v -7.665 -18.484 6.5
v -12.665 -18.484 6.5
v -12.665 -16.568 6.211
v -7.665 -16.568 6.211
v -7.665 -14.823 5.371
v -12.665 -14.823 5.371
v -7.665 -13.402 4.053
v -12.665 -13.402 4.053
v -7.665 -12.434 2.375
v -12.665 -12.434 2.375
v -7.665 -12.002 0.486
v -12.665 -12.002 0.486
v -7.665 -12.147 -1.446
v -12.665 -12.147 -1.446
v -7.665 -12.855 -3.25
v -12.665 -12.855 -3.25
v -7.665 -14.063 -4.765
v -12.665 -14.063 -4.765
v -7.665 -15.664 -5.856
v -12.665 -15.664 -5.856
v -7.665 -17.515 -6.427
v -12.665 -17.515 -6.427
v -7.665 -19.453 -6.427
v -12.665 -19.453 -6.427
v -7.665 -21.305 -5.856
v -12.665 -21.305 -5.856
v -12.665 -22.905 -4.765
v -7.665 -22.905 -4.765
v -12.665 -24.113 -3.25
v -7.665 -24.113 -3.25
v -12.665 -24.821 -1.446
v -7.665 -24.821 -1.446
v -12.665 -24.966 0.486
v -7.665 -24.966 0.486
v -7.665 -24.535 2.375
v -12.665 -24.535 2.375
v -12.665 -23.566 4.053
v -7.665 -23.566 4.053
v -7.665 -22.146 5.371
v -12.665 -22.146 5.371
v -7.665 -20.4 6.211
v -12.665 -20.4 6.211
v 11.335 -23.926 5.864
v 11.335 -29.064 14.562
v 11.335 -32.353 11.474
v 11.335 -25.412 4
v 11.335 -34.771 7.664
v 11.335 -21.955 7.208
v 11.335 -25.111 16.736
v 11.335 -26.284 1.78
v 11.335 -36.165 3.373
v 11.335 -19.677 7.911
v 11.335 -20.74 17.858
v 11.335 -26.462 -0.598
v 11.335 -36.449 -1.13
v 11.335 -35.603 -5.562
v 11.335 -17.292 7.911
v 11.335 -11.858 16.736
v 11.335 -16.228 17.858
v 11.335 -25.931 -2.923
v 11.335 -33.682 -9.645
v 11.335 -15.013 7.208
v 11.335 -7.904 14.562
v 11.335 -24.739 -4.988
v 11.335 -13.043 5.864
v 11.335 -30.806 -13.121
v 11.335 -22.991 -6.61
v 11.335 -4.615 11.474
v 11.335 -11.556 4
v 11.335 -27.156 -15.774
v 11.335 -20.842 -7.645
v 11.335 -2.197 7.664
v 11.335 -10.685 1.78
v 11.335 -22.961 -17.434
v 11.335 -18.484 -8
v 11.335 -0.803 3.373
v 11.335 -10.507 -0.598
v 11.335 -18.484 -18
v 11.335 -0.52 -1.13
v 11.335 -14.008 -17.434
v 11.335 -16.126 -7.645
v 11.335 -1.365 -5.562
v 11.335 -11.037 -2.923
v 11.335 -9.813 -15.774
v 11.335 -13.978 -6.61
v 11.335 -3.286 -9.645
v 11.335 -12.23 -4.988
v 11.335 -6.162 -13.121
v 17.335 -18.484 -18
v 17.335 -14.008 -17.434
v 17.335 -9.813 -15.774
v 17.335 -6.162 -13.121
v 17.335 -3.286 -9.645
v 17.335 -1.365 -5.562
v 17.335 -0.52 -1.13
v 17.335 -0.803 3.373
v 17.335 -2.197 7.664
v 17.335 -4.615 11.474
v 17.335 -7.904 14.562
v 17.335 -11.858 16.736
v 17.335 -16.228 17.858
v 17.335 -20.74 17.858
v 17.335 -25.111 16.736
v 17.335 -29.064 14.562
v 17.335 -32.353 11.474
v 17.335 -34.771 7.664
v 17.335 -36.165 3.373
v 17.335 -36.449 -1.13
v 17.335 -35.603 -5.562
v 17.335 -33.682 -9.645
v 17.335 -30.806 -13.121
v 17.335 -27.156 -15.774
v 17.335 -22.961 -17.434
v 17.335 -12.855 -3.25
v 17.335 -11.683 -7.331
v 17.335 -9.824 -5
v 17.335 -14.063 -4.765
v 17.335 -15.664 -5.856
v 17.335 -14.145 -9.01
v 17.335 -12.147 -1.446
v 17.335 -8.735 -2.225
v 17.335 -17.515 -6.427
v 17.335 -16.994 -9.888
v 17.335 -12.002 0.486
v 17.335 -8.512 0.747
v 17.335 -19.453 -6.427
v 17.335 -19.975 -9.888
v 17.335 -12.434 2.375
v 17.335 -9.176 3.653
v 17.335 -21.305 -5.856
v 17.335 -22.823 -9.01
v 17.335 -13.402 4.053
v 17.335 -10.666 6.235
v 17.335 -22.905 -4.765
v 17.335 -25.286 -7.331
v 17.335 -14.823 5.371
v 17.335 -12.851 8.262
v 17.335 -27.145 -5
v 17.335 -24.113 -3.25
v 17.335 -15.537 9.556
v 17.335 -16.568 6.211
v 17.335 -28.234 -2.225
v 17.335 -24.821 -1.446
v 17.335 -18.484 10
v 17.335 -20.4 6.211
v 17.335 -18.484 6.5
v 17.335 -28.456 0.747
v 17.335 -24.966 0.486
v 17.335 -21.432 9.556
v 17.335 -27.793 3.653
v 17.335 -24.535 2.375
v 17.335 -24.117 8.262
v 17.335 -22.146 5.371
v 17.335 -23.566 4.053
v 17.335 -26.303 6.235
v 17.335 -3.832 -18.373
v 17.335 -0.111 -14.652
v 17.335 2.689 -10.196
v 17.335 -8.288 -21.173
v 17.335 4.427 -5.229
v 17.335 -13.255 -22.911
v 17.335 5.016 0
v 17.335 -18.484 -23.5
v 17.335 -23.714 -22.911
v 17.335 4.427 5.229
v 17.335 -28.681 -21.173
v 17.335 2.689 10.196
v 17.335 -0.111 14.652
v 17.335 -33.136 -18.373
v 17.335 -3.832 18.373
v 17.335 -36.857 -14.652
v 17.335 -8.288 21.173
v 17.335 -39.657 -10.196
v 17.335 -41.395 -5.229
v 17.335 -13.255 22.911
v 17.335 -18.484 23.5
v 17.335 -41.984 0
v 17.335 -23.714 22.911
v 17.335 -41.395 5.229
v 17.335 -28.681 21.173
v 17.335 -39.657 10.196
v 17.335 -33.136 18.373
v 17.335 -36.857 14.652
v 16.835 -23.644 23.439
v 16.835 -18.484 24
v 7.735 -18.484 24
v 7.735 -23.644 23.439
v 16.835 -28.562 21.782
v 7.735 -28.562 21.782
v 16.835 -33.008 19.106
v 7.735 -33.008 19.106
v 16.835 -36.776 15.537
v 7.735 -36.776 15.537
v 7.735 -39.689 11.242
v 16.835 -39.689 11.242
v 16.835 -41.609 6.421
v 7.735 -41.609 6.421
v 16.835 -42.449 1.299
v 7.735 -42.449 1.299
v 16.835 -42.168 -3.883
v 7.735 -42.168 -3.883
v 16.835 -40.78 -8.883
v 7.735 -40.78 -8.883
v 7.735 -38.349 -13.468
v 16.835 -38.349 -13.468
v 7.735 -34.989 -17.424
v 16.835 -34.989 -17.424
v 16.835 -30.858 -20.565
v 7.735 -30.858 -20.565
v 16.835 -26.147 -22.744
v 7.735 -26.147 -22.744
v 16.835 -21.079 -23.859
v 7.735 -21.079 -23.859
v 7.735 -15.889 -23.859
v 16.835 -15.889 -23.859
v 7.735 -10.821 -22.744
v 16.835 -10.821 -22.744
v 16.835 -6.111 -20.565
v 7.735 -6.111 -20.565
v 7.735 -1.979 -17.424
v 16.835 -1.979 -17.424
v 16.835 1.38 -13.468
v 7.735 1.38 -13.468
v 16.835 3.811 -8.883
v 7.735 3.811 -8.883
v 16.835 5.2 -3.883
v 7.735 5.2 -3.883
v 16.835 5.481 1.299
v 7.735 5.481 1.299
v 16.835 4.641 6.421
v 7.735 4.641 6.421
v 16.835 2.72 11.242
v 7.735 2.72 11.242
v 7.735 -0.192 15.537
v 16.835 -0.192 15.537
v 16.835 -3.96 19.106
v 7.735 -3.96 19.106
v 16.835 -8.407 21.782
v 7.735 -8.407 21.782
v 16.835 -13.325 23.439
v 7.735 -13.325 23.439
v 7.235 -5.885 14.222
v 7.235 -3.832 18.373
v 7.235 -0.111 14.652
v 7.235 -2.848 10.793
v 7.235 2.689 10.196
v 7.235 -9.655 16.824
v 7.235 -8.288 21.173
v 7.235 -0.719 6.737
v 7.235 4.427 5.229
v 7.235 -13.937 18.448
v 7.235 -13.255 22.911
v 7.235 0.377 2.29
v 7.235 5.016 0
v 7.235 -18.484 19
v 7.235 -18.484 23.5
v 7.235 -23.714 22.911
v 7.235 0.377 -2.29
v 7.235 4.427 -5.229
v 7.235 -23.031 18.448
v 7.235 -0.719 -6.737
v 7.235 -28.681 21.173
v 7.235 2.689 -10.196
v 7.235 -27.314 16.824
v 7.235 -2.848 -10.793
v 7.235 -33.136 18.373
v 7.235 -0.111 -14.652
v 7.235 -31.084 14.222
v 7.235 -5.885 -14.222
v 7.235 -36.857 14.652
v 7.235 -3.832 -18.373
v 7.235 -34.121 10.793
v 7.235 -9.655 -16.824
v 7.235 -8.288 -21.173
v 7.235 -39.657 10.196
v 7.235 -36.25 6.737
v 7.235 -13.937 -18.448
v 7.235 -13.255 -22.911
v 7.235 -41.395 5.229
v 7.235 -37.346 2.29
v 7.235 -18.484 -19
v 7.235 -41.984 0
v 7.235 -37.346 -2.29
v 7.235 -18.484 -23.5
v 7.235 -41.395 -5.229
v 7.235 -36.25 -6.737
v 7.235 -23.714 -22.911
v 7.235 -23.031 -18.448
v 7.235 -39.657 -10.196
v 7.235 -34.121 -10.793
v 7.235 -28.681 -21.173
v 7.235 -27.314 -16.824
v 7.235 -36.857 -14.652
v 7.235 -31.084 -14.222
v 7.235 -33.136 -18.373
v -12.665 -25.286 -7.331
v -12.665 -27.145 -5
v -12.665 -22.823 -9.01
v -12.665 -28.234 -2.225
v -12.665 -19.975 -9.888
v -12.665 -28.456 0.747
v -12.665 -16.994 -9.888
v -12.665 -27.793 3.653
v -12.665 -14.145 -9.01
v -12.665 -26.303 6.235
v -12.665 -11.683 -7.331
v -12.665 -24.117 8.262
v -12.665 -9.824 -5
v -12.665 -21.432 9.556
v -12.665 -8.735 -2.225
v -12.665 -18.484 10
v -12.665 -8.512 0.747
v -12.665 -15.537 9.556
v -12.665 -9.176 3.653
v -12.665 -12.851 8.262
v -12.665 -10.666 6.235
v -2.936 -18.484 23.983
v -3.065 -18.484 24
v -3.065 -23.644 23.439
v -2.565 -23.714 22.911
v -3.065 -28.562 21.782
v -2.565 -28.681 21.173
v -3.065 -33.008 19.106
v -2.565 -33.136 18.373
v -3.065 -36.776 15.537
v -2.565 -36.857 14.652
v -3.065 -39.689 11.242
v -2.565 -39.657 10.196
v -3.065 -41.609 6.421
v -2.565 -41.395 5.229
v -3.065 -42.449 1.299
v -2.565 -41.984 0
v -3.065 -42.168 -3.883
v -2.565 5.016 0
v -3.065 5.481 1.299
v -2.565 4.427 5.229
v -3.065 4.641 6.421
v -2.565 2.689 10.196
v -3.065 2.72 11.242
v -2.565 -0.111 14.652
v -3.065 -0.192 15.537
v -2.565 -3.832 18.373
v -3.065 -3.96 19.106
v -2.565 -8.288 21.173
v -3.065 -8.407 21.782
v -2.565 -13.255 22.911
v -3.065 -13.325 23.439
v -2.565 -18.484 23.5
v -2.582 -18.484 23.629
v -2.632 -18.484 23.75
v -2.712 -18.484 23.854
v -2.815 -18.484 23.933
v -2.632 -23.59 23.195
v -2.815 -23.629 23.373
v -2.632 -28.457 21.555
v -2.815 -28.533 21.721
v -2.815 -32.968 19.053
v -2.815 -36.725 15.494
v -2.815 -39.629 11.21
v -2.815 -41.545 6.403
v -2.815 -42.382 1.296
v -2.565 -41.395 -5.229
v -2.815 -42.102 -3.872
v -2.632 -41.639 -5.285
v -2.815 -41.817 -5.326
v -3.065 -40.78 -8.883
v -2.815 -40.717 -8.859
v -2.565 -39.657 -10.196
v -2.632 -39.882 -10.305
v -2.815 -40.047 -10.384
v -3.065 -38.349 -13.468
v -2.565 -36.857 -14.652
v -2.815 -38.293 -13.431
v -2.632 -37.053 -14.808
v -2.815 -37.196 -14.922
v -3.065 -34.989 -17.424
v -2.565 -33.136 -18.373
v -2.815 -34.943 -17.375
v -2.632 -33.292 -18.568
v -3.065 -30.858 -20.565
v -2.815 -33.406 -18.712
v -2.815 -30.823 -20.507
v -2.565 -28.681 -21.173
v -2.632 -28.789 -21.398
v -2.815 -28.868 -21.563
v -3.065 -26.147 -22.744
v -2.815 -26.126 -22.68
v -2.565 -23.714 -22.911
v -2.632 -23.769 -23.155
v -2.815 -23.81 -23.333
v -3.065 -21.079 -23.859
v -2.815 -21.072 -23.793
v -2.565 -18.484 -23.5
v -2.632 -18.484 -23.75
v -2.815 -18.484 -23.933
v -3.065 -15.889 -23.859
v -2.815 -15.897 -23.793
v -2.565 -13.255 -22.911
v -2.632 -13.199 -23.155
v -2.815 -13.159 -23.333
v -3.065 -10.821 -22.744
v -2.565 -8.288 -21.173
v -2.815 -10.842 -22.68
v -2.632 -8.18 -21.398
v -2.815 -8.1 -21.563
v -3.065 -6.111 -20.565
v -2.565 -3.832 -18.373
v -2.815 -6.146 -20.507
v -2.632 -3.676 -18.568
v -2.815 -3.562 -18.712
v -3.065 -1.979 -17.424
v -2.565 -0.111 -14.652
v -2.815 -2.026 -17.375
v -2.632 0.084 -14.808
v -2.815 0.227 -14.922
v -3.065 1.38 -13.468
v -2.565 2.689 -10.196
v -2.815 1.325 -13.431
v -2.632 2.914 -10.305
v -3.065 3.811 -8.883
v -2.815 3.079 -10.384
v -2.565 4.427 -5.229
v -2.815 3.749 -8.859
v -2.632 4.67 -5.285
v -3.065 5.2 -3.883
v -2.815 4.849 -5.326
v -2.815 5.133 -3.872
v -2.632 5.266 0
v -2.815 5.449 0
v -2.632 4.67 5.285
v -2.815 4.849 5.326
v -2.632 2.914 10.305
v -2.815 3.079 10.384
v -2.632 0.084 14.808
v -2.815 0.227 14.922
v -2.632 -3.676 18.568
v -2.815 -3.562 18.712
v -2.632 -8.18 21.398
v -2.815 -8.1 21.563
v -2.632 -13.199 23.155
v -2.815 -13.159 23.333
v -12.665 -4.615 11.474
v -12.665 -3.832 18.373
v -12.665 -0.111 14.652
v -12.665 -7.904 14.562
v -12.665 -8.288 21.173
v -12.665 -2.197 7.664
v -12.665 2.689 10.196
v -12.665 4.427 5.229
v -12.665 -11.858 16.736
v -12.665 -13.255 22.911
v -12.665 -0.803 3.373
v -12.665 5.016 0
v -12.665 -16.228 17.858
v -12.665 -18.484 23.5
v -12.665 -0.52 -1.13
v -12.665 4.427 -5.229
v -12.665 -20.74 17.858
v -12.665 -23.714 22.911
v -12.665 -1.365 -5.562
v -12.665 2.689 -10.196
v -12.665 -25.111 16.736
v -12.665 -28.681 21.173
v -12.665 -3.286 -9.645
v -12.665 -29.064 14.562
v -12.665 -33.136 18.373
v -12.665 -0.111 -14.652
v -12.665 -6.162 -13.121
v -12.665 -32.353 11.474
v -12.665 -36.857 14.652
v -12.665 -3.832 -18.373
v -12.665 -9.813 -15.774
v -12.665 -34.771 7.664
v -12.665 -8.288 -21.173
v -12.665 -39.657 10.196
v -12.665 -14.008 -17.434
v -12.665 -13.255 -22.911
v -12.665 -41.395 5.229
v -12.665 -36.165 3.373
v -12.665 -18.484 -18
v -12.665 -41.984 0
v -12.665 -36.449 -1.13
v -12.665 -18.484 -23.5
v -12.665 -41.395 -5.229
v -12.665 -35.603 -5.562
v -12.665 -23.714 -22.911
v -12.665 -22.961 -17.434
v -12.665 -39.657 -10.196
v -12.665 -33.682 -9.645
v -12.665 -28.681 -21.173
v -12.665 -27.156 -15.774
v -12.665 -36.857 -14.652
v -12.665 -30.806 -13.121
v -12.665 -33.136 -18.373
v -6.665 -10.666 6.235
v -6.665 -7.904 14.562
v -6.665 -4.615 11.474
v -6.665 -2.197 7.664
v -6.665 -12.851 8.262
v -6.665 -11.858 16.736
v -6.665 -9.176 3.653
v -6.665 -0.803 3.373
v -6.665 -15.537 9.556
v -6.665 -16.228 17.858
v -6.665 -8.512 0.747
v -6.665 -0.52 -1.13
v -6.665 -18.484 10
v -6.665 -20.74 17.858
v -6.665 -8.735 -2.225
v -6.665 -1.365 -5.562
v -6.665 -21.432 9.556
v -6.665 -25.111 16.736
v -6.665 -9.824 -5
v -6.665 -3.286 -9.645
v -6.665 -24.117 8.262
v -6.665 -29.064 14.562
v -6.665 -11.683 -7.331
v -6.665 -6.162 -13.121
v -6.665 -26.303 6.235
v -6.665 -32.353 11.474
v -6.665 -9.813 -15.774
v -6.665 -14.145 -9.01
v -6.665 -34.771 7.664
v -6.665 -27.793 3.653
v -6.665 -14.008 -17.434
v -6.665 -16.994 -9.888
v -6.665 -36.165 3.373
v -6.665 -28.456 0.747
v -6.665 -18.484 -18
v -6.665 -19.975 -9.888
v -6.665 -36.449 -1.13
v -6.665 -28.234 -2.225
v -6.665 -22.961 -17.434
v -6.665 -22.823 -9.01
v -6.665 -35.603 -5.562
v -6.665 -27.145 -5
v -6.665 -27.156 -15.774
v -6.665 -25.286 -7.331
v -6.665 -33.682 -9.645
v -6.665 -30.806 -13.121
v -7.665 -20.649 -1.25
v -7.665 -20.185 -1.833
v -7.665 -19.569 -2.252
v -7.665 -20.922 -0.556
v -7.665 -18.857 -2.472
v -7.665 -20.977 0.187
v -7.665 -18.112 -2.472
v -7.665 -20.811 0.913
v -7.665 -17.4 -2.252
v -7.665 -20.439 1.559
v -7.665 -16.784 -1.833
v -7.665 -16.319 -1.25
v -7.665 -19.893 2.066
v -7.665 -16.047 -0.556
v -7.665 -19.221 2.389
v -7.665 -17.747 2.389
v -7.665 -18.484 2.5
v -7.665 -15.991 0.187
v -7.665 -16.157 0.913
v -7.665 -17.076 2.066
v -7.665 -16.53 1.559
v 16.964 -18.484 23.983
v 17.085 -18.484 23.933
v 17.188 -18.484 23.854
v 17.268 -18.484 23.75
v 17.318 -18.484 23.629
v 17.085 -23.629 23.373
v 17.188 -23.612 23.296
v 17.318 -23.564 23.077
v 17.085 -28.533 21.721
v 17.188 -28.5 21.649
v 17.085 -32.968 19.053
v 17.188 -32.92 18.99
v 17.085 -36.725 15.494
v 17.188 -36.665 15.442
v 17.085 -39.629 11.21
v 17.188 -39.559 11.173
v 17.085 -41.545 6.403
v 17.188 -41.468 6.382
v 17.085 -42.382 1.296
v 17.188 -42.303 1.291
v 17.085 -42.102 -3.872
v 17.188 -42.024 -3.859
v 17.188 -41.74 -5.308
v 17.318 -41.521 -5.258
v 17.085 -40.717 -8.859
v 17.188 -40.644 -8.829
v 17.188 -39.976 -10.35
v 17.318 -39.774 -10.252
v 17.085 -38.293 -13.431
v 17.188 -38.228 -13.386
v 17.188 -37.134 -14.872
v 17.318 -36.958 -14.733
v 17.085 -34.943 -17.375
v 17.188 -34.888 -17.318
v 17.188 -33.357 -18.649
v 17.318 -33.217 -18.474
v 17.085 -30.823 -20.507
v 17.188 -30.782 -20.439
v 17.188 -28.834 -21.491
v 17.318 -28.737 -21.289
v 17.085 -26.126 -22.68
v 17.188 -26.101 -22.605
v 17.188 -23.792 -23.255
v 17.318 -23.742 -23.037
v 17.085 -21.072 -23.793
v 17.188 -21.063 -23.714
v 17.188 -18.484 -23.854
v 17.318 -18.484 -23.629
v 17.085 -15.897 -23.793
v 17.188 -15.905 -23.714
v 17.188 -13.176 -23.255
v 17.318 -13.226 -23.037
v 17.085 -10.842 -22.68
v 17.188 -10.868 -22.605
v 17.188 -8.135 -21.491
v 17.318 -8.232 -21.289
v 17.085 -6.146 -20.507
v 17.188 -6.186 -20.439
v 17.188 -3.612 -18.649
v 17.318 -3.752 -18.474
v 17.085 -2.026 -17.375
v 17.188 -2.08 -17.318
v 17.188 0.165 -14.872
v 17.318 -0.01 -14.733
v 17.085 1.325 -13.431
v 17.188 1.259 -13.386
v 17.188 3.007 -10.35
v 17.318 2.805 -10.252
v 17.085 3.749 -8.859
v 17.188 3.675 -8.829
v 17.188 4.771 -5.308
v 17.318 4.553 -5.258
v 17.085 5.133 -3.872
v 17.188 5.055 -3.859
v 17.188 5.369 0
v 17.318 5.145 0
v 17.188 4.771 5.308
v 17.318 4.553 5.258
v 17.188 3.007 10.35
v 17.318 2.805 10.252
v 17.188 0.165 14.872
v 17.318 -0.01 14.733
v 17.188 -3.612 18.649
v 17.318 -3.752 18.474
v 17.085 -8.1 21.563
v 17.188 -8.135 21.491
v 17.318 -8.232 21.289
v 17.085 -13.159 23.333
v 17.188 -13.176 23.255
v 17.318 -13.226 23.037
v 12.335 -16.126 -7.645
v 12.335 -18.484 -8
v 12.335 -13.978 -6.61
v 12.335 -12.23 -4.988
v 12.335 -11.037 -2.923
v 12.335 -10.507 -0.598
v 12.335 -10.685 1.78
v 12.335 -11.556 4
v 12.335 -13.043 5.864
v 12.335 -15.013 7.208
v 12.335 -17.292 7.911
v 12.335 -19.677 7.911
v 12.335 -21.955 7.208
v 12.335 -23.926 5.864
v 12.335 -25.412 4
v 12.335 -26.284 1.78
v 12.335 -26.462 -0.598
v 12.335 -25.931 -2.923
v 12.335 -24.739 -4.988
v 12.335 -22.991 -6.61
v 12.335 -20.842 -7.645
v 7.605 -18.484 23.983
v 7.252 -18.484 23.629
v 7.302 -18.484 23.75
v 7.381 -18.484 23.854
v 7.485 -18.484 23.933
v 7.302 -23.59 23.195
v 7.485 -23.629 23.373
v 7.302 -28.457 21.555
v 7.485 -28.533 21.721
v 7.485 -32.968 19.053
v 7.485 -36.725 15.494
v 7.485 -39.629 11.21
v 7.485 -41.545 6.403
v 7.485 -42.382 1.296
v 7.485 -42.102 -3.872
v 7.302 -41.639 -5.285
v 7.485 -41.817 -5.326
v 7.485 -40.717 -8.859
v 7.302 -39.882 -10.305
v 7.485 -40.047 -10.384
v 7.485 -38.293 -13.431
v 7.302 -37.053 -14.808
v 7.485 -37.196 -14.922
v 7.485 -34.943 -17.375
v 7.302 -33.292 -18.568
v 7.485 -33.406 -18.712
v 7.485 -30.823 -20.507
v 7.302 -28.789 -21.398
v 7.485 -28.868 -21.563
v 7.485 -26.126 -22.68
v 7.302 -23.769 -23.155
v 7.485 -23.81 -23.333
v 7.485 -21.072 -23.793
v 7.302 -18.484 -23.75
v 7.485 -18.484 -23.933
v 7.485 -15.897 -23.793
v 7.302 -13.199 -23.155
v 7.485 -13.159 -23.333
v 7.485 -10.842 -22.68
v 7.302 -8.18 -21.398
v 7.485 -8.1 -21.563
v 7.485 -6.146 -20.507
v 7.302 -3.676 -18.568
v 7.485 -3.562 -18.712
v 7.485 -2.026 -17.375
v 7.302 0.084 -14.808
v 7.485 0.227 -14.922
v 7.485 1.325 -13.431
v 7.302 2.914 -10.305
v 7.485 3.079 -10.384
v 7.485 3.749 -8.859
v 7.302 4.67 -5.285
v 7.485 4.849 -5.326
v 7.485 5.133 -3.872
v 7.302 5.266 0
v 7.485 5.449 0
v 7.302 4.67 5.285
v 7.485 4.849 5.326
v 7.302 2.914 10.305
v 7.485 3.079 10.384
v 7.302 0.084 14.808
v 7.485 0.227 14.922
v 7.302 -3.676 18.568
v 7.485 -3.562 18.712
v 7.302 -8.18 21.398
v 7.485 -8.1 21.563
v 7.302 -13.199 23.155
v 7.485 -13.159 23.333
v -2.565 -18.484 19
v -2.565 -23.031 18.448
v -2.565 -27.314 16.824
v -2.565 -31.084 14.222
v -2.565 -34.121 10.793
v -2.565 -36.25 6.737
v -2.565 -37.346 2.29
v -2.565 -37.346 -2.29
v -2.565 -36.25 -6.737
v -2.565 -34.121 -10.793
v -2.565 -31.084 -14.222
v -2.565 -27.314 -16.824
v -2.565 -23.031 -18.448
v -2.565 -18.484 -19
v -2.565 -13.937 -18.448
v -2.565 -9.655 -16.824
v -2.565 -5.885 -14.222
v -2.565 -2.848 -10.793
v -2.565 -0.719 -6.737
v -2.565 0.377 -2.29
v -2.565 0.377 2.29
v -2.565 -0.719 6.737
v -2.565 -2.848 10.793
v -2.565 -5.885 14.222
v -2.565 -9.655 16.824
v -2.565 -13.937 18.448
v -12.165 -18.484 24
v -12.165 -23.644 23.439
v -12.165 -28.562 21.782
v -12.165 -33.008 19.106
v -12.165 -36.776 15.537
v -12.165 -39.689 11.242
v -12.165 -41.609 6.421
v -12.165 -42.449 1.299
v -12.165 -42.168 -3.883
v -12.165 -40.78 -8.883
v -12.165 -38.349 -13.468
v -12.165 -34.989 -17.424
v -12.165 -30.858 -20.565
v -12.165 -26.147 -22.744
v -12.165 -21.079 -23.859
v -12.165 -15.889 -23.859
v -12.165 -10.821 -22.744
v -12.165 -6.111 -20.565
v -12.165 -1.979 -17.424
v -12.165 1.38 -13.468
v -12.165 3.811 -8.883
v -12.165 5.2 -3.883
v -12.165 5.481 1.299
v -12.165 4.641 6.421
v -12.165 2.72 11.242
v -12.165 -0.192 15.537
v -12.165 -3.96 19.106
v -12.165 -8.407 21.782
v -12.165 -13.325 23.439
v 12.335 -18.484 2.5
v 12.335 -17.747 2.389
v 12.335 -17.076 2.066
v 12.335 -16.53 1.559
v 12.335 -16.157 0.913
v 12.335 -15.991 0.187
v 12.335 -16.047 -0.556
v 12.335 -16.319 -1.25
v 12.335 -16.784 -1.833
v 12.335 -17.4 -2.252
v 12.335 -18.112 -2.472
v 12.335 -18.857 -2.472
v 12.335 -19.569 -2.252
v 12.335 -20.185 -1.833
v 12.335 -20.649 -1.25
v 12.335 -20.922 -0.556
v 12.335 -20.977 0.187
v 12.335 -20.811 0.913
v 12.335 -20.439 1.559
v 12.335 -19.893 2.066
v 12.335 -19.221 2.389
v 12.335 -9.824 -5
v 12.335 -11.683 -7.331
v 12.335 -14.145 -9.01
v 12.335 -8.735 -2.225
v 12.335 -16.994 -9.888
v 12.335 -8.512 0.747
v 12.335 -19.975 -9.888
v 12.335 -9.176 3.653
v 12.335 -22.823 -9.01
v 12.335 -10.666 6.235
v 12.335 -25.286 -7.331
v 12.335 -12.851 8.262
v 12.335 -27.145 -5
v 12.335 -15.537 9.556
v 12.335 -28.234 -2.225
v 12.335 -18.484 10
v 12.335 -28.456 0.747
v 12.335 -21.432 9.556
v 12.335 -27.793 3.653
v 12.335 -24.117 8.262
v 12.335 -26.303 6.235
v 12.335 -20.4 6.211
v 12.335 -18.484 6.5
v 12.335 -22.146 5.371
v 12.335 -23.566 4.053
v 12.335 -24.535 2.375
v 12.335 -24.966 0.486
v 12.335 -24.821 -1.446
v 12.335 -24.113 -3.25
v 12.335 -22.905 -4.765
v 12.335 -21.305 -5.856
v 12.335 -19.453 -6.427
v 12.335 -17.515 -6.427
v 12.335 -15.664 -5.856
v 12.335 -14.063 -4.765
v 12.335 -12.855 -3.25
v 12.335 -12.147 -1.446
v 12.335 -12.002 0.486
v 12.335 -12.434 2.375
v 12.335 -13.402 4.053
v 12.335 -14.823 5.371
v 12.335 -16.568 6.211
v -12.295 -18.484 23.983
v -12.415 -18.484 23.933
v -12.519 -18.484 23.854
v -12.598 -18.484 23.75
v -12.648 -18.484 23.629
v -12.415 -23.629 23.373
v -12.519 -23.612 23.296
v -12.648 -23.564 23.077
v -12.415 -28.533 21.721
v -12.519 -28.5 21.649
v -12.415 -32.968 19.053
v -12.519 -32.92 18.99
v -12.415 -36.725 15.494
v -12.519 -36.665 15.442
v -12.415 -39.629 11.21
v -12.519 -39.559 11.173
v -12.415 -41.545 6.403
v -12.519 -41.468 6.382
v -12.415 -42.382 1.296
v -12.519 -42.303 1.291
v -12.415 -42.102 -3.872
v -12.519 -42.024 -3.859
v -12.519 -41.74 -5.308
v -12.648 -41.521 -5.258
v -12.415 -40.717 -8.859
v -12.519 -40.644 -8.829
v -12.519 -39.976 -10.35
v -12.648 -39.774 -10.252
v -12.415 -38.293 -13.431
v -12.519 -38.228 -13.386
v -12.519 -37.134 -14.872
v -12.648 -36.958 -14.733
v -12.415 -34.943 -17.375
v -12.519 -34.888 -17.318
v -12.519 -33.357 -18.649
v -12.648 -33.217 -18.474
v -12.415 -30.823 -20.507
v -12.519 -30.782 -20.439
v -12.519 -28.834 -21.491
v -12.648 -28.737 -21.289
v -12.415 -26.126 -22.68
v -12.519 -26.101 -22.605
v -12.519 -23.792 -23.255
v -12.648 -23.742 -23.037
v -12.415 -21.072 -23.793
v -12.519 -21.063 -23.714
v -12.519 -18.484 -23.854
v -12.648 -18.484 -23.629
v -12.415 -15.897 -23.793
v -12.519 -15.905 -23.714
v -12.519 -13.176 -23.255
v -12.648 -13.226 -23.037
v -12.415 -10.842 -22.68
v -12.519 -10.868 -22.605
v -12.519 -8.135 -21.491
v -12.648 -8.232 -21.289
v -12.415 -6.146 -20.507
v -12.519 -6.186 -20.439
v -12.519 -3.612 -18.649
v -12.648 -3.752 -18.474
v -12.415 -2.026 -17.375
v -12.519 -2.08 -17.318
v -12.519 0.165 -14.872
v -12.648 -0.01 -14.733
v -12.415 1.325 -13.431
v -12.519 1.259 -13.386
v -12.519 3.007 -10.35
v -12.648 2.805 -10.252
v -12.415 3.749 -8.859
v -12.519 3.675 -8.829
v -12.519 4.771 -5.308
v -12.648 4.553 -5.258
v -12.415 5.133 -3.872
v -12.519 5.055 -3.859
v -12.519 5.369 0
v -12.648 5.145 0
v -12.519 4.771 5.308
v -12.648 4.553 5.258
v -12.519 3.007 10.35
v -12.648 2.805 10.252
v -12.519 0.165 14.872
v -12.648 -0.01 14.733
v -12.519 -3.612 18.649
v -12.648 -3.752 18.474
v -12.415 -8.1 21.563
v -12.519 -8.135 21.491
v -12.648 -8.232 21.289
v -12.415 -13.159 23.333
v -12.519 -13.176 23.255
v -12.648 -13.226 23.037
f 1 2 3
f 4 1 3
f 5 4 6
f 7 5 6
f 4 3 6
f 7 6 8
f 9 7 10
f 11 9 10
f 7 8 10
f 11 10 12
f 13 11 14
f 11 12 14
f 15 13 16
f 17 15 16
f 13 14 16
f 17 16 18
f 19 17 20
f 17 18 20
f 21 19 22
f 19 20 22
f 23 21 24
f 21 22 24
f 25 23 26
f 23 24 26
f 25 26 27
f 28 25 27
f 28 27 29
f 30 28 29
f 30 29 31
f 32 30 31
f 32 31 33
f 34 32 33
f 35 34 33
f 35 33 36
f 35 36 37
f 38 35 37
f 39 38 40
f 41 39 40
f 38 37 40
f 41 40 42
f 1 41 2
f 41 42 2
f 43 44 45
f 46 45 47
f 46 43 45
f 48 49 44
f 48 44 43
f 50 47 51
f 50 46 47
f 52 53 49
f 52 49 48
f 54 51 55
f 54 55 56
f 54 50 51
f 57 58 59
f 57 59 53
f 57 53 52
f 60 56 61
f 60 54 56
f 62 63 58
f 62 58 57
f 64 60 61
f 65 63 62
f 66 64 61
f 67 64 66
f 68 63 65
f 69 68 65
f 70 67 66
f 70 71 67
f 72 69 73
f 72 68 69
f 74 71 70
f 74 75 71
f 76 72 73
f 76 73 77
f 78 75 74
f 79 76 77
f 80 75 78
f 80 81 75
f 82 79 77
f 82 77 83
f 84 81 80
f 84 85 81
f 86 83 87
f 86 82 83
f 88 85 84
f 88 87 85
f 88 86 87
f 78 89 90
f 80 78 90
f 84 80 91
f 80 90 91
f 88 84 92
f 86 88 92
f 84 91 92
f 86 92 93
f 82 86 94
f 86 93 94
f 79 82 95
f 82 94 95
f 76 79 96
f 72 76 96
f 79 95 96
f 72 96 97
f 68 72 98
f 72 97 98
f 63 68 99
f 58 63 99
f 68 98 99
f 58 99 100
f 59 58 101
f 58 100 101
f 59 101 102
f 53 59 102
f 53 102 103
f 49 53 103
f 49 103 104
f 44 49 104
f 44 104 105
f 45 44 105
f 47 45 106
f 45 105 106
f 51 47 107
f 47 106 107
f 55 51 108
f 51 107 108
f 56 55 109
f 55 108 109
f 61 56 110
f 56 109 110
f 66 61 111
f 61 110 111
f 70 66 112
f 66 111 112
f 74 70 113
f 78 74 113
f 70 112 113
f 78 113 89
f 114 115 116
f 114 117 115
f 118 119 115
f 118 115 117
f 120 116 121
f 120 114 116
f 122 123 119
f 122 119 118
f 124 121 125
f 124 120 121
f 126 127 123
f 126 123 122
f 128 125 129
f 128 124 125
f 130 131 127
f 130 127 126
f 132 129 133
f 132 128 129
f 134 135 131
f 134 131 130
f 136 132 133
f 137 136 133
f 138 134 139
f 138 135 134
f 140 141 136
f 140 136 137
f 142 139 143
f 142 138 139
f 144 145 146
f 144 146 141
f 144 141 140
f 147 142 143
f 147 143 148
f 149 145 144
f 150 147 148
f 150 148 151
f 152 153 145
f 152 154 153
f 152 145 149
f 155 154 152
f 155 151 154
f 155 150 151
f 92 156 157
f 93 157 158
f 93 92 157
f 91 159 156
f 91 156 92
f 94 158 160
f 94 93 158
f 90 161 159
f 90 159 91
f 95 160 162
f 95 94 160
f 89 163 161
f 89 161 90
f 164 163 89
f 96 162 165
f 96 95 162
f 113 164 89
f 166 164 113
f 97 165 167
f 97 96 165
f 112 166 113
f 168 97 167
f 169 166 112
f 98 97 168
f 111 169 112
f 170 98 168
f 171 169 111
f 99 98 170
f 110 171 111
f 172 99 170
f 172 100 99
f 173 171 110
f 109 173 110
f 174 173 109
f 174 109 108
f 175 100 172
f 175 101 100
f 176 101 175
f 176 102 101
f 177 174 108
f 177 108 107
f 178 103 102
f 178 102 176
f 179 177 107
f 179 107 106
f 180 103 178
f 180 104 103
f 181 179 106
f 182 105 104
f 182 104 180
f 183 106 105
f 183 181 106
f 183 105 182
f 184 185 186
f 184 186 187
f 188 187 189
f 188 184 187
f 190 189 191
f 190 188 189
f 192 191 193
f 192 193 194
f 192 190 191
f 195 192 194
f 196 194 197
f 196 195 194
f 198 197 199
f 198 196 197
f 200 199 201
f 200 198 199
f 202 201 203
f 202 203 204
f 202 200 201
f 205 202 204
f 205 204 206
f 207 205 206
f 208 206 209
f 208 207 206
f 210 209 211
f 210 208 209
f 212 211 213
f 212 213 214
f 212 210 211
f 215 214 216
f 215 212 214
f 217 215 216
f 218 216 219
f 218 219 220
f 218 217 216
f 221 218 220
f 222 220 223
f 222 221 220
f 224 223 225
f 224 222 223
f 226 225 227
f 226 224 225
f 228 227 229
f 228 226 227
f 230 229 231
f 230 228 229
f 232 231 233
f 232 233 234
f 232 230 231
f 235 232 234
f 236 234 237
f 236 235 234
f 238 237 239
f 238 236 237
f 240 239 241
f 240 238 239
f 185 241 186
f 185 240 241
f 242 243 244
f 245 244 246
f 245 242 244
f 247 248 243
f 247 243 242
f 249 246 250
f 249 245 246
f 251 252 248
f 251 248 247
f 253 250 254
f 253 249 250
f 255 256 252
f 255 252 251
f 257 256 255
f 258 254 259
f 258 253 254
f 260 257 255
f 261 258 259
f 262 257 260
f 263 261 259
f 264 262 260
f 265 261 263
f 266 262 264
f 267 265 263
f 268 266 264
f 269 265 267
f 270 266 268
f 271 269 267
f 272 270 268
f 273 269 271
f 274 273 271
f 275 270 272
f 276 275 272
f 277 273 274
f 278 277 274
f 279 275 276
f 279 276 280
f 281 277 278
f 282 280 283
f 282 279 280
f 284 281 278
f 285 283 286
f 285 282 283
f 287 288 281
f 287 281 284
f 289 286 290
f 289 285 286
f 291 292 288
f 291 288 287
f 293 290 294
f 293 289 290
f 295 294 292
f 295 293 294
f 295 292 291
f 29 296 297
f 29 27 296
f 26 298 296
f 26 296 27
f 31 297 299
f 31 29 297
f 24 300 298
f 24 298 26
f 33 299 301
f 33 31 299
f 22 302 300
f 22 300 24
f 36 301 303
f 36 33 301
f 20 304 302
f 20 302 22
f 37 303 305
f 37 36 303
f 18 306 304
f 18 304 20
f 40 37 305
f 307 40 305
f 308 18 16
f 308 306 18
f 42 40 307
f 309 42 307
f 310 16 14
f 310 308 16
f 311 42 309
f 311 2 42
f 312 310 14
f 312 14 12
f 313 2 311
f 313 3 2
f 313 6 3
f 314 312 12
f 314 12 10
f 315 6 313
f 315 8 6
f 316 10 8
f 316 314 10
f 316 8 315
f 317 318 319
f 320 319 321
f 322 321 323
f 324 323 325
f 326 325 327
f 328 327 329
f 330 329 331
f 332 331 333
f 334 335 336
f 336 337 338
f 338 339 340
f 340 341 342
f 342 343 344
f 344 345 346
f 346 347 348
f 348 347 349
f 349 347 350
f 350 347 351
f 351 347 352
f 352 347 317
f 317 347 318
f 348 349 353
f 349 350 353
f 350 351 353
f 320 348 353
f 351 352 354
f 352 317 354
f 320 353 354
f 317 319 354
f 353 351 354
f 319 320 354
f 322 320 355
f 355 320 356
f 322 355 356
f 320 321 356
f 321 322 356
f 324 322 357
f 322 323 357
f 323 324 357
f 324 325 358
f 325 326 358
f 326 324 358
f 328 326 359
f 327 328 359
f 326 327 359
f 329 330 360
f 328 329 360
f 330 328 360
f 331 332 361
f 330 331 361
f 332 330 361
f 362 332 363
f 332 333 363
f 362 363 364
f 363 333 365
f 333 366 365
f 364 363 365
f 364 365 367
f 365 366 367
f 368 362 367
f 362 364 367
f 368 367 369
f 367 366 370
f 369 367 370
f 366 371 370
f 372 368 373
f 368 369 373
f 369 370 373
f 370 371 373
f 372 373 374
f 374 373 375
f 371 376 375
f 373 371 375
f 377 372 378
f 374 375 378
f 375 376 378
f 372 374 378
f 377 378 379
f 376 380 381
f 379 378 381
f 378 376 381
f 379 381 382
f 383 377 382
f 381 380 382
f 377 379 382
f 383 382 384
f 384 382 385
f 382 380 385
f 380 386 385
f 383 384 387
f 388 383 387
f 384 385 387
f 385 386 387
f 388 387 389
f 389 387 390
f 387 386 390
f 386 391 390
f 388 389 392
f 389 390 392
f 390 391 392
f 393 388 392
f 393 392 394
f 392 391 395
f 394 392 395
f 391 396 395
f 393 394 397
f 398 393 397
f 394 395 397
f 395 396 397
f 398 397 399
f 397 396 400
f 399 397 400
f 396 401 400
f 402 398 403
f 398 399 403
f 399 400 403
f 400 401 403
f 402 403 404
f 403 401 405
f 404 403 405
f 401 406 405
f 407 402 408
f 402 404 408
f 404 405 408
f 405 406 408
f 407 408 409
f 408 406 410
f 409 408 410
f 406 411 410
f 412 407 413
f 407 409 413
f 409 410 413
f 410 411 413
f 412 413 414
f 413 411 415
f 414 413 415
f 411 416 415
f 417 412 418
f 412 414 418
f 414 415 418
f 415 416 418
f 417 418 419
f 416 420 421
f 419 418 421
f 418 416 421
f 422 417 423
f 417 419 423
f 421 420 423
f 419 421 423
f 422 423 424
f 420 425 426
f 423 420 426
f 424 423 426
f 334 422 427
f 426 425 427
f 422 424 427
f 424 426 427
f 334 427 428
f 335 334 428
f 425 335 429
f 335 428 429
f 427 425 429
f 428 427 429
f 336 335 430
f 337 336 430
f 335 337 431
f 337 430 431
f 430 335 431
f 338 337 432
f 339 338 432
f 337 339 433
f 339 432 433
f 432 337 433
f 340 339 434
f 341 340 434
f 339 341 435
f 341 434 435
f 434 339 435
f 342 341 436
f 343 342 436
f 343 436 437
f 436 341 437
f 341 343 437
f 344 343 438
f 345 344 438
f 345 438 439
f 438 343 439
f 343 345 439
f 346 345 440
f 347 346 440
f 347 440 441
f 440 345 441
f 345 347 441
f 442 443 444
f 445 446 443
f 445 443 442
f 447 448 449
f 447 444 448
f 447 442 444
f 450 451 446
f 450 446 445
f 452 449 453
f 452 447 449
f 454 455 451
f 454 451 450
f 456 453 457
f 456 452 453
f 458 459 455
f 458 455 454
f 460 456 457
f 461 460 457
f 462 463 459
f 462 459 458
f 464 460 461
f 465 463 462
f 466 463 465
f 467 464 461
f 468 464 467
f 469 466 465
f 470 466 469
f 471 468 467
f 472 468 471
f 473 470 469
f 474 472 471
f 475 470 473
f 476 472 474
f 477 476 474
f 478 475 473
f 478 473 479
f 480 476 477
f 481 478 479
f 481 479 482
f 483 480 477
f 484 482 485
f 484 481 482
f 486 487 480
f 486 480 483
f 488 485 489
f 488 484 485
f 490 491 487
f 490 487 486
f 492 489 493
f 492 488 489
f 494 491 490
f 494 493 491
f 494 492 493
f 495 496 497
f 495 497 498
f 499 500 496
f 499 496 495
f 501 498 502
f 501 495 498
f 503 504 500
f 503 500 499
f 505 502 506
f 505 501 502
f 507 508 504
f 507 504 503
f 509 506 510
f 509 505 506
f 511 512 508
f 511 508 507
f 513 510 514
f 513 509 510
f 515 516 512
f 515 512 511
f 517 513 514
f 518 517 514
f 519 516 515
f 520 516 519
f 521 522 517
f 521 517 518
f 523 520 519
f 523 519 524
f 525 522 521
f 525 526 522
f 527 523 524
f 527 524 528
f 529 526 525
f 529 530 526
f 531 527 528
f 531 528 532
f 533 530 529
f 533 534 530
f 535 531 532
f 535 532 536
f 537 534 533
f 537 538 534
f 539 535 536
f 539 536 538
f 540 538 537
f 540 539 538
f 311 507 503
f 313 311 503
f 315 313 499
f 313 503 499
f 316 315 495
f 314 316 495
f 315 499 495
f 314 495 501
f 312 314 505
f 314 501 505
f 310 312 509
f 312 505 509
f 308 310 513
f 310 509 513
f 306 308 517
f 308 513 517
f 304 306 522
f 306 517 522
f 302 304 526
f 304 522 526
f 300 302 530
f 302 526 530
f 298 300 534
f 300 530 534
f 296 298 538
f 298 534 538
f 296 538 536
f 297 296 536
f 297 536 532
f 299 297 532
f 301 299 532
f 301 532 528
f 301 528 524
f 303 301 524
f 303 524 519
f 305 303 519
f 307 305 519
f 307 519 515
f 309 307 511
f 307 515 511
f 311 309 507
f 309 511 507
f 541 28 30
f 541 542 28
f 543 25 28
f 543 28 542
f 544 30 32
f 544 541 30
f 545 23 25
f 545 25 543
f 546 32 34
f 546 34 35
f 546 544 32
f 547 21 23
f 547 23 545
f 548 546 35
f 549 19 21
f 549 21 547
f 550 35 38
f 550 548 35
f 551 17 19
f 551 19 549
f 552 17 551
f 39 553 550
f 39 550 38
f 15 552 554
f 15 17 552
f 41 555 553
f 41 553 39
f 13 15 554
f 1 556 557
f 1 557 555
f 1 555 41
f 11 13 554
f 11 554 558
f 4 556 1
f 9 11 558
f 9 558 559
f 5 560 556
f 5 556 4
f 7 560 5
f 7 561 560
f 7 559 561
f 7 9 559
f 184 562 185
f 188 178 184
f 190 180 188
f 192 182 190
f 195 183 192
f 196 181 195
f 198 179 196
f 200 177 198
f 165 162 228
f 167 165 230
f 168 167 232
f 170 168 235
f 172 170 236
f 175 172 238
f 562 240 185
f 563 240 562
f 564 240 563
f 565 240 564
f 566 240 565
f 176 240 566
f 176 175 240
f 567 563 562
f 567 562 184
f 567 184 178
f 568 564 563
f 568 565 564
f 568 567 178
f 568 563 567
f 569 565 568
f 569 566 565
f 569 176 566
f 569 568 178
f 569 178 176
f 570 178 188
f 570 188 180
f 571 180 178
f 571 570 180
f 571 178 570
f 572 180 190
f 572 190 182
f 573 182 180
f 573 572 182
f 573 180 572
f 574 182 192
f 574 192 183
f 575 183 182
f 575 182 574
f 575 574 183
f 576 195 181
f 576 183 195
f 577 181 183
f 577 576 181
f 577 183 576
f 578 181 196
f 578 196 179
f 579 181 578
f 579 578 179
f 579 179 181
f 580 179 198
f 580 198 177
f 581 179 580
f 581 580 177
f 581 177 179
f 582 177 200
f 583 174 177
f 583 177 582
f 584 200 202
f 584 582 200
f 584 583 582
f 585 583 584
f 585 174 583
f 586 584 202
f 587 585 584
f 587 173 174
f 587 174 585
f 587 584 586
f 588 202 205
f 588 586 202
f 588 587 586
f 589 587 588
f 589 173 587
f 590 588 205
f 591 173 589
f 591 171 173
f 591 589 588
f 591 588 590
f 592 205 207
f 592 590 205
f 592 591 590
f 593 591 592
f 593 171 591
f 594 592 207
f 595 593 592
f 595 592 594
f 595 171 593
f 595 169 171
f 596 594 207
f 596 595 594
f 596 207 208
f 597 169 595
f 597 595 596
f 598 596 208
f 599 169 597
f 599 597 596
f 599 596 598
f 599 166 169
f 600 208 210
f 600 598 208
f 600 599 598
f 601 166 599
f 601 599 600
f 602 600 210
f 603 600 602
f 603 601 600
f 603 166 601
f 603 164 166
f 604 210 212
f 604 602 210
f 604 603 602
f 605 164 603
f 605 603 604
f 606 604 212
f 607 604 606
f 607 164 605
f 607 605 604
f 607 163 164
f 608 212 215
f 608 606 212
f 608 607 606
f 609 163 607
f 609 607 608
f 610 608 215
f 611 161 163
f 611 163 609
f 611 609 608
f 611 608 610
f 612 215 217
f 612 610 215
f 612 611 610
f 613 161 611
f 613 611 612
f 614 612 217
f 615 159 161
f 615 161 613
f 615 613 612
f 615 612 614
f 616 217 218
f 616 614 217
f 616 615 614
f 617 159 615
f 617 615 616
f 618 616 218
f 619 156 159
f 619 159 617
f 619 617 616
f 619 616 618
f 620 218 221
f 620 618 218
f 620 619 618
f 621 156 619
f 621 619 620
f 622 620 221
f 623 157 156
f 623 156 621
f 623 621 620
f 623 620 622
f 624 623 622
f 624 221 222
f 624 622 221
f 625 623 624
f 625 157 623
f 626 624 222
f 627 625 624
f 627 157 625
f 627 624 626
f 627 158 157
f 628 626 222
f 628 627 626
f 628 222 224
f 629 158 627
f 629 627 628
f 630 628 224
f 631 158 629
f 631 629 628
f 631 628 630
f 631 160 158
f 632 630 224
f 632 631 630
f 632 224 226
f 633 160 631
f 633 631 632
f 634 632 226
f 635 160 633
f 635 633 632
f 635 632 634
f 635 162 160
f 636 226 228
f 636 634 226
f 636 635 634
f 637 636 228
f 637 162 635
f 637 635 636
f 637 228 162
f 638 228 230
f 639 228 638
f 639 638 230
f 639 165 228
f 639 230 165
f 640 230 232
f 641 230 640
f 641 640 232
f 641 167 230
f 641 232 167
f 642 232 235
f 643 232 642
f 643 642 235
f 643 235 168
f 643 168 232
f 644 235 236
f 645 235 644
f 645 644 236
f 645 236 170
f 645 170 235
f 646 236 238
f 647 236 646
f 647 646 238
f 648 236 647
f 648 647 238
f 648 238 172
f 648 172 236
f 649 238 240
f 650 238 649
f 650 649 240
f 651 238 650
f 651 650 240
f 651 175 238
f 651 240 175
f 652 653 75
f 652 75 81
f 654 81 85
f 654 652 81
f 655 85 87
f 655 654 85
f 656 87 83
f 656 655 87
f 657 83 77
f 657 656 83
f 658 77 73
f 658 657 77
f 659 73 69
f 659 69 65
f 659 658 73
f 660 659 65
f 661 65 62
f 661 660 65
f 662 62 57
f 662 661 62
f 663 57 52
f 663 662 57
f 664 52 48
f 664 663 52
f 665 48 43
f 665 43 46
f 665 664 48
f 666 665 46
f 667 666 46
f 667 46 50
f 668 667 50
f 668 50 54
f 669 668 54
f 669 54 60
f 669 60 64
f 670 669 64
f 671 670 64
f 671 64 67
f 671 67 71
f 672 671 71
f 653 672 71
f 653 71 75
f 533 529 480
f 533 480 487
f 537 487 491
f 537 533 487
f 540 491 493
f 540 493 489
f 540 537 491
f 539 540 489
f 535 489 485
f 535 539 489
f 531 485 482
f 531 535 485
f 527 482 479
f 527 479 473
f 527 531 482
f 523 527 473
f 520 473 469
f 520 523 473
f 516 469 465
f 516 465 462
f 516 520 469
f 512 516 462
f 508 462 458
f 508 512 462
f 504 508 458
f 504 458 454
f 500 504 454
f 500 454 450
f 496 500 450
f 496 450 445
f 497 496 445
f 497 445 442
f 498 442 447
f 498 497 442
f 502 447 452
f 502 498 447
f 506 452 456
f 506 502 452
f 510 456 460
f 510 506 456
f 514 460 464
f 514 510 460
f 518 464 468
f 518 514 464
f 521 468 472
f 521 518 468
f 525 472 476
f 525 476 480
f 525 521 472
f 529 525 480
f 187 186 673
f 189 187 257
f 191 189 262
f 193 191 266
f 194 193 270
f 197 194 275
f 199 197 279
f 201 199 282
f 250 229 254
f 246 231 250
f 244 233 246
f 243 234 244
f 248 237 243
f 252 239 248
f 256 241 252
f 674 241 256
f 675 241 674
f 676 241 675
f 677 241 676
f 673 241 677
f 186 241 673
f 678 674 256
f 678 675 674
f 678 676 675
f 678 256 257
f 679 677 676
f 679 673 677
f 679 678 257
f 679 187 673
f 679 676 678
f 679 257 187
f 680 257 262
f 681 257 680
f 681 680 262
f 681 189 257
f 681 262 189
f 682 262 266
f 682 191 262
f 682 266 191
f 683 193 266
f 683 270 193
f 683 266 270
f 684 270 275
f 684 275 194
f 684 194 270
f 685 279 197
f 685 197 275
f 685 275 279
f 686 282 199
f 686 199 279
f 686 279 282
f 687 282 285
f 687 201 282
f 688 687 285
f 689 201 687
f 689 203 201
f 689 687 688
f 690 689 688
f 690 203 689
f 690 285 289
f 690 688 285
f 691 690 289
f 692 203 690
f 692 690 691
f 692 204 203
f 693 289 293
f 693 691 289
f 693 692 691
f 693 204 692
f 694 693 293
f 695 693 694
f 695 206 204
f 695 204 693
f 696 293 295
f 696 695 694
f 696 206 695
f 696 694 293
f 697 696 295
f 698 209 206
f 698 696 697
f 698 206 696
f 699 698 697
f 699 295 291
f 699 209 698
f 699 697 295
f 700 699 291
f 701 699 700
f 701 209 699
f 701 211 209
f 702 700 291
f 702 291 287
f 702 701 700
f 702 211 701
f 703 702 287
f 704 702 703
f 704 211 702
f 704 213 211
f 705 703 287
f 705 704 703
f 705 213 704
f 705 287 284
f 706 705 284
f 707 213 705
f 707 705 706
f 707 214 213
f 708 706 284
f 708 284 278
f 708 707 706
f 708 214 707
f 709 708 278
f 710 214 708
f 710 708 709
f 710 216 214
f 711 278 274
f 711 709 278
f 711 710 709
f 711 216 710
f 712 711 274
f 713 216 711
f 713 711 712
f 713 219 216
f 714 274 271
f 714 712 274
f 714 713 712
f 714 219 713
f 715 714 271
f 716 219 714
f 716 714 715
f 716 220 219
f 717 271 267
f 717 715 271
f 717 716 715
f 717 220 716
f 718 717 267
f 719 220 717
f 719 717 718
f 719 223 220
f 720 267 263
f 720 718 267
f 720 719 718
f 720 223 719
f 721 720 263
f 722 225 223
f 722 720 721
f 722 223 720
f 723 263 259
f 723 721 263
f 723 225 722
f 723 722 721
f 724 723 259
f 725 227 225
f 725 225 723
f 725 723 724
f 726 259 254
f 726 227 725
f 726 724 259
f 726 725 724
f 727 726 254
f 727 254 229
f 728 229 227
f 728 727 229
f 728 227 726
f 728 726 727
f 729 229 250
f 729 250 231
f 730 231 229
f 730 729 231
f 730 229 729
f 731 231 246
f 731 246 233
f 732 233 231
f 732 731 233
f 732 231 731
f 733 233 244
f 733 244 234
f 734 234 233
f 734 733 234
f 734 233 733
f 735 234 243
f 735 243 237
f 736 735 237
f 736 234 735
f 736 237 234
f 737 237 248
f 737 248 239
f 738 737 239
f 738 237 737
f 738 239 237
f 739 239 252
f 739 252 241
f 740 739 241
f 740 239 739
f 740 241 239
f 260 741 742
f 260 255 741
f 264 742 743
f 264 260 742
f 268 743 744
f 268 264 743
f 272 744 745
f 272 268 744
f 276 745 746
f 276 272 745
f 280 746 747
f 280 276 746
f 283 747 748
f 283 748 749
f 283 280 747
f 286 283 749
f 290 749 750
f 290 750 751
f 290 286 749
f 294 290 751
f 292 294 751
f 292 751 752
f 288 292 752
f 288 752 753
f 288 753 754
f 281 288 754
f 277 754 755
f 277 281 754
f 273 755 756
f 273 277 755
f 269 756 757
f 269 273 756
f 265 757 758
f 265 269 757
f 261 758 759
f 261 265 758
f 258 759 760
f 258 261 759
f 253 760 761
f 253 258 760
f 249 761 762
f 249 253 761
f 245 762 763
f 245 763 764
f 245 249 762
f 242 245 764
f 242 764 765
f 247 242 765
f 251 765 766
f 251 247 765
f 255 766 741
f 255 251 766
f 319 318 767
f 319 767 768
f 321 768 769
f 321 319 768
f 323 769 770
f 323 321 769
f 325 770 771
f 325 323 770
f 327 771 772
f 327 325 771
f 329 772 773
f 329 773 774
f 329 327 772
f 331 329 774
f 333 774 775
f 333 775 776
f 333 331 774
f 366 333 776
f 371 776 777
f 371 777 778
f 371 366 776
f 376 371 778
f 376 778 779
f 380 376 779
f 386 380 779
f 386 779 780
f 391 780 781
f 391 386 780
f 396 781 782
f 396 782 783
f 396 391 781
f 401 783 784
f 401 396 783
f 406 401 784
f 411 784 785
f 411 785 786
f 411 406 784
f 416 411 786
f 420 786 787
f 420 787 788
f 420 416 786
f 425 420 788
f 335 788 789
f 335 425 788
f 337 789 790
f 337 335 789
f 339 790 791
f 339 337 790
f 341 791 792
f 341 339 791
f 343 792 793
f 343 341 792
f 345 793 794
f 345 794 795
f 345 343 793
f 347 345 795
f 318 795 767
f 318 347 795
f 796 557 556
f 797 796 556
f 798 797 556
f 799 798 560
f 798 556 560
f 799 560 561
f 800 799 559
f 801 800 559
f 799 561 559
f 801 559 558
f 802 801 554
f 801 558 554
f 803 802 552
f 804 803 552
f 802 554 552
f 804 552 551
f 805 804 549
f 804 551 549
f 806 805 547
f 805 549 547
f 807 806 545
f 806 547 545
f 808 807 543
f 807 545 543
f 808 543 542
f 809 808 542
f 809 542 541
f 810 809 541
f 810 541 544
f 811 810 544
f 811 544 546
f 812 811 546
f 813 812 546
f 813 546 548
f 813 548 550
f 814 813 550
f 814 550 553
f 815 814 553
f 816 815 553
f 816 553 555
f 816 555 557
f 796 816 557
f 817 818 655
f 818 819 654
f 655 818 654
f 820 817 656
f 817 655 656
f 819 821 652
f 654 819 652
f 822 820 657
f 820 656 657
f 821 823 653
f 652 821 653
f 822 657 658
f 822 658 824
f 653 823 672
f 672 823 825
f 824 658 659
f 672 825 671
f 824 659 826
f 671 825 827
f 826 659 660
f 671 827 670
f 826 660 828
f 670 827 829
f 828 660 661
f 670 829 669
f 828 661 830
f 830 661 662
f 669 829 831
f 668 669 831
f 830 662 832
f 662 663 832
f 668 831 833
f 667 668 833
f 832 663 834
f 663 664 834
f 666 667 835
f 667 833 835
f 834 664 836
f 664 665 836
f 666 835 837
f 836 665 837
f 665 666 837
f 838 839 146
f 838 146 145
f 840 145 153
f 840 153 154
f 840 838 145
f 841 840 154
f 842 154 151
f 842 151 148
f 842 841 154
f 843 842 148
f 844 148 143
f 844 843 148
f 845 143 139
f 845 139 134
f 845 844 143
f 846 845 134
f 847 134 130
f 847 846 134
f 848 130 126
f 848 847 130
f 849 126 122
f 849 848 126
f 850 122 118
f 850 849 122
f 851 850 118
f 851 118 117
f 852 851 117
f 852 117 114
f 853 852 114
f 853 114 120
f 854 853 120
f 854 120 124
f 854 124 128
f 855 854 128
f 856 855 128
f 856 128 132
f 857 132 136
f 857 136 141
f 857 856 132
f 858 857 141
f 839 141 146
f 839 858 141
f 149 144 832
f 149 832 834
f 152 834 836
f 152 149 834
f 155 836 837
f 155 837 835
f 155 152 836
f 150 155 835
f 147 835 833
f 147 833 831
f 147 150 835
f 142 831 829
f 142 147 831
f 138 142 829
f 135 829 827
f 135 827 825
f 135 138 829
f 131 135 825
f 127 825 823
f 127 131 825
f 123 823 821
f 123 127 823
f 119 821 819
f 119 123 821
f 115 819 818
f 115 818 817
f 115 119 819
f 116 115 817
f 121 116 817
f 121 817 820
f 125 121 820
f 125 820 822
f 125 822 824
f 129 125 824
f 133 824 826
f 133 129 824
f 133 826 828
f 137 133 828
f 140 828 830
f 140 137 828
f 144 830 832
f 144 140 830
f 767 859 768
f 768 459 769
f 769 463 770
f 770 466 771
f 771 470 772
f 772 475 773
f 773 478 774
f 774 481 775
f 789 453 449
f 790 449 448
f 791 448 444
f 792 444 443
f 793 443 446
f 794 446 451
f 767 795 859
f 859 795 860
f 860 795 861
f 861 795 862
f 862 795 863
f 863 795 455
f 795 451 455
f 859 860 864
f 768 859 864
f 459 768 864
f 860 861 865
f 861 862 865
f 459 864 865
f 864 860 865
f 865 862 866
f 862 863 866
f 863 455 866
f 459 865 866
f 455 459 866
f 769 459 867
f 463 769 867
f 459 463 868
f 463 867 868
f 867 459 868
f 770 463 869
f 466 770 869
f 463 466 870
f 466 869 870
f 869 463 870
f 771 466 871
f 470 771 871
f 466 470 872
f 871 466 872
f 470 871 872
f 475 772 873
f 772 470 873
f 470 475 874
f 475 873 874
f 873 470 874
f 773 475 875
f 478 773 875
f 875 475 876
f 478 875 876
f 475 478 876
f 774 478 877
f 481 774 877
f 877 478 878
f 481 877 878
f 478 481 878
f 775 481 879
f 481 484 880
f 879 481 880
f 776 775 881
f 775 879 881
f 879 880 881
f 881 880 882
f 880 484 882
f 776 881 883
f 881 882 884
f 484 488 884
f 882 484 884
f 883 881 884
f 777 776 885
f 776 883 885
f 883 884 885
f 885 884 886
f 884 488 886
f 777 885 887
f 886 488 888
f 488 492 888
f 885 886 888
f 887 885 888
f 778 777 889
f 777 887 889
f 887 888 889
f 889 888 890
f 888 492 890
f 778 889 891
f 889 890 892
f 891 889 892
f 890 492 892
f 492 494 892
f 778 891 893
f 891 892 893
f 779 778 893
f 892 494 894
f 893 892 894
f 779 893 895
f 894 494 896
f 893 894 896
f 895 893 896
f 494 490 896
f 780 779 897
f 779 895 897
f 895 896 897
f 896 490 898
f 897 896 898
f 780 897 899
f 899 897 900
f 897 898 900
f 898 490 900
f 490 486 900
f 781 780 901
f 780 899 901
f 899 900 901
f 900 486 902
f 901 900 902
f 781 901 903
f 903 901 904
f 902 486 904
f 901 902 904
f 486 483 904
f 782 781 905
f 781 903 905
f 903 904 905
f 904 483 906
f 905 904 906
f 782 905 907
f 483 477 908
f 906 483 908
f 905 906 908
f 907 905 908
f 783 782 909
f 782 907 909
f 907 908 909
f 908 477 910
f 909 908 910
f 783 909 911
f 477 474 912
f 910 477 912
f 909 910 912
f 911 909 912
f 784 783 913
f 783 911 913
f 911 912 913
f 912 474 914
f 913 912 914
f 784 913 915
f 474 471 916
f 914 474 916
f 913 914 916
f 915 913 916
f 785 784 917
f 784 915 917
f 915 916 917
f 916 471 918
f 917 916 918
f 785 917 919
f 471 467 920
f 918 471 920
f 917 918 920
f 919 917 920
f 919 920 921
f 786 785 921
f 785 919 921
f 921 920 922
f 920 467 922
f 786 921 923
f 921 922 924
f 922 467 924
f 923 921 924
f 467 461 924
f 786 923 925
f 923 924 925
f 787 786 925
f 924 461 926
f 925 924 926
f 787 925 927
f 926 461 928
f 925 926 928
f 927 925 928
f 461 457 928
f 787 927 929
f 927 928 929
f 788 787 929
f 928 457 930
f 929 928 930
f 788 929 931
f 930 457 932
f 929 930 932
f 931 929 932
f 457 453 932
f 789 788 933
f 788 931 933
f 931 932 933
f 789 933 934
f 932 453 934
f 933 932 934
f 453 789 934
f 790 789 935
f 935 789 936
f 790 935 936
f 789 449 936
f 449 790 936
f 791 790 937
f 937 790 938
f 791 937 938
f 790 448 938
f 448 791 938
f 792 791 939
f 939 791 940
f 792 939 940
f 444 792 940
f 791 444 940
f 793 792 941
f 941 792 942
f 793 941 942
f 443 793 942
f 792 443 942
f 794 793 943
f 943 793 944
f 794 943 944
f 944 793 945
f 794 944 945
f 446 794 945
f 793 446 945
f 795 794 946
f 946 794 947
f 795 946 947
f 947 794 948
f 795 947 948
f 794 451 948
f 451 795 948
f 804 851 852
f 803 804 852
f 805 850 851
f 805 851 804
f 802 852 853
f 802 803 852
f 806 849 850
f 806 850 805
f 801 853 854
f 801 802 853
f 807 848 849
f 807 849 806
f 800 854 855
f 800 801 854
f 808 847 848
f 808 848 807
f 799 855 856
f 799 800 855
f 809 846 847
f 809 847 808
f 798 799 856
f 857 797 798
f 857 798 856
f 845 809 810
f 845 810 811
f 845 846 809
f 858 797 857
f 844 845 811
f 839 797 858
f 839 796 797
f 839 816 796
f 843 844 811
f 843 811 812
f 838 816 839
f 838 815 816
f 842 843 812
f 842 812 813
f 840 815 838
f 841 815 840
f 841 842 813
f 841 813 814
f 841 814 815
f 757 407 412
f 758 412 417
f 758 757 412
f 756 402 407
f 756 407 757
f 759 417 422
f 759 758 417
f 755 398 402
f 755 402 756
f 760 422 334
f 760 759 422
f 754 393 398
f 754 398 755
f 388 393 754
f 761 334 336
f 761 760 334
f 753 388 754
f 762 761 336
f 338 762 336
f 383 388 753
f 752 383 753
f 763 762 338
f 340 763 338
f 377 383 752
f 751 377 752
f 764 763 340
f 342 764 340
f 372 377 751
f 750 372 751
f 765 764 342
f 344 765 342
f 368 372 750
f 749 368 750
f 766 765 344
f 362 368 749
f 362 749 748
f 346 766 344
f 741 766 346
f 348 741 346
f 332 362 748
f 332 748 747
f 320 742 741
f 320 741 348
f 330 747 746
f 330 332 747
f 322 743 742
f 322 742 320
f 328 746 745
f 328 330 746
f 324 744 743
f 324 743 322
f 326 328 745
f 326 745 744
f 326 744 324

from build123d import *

# Parameters (mm, degrees)
SKETCH3_R           = 2
CUT_EXTRUDE1_DEPTH  = 58.27924924
FILLET2_R           = 0.5
SKETCH4_R           = 18
SKETCH4_R_2         = 6
CUT_EXTRUDE2_DEPTH  = 6
CUT_EXTRUDE3_START  = -6
SKETCH5_R           = 18
CUT_EXTRUDE3_DEPTH  = 6
SKETCH6_R           = 10
BOSS_EXTRUDE1_DEPTH = 6
SKETCH8_R           = 8
BOSS_EXTRUDE2_DEPTH = 10
SKETCH10_R          = 6.5
CUT_EXTRUDE5_DEPTH  = 5
SKETCH11_R          = 10
BOSS_EXTRUDE3_DEPTH = 5
CUT_EXTRUDE6_START  = -5
SKETCH12_R          = 6.5
CUT_EXTRUDE6_DEPTH  = 5
SKETCH7_R           = 2.5
CUT_EXTRUDE8_DEPTH  = 58.279249356


with BuildPart() as part:
    # Sketch2 → Revolve1 (revolve)
    with BuildSketch(Plane.XY, mode=Mode.PRIVATE) as revolve1_sk:
        Polygon((-2.565200875, 0.515739462), (7.234799125, 0.515739462), (7.234799125, 5.515739462), (17.334799125, 5.515739462), (17.334799125, -18.484260538), (-12.665200875, -18.484260538), (-12.665200875, 5.515739462), (-2.565200875, 5.515739462), align=None)
    revolve(revolve1_sk.sketch.rotate(Axis((-12.665200875, -18.484260538, 0), (1, 0, 0)), 90), axis=Axis((-12.665200875, -18.484260538, 0), (1, 0, 0)))

    # Sketch3 → Cut-Extrude1 (cut, through all)
    with BuildSketch(Plane(origin=(17.334799125, 0, 0), x_dir=(0, 0, -1), z_dir=(1, 0, 0))):
        with Locations((0, -18.484260538)):
            Circle(SKETCH3_R)
    extrude(amount=-CUT_EXTRUDE1_DEPTH, mode=Mode.SUBTRACT)

    # Fillet2
    fillet2_edges = [part.edges().sort_by_distance(p)[0] for p in [
        (-2.565200875, -18.484260538, -24),
        (7.234799125, -18.484260538, -24),
        (17.334799125, -18.484260538, -24),
        (-12.665200875, -18.484260538, -24),
    ]]
    fillet(fillet2_edges, radius=FILLET2_R)

    # Sketch4 → Cut-Extrude2 (cut)
    with BuildSketch(Plane(origin=(17.334799125, 0, 0), x_dir=(0, 0, -1), z_dir=(1, 0, 0))):
        with Locations((0, -18.484260538)):
            Circle(SKETCH4_R)
        with Locations((0, -18.484260538)):
            Circle(SKETCH4_R_2, mode=Mode.SUBTRACT)
    extrude(amount=-CUT_EXTRUDE2_DEPTH, mode=Mode.SUBTRACT)

    # Sketch5 → Cut-Extrude3 (cut)
    with BuildSketch(Plane.ZY.offset(12.665200875).offset(CUT_EXTRUDE3_START)):
        with Locations(Location((0, -18.484260538, 0), (0, 0, 180))):
            Circle(SKETCH5_R)
    extrude(amount=CUT_EXTRUDE3_DEPTH, mode=Mode.SUBTRACT)

    # Sketch6 → Boss-Extrude1 (add, through all)
    with BuildSketch(Plane.ZY.offset(6.665200875)):
        with Locations((0, -18.484260538)):
            Circle(SKETCH6_R)
    extrude(amount=BOSS_EXTRUDE1_DEPTH)

    # Sketch8 → Boss-Extrude2 (add)
    with BuildSketch(Plane(origin=(17.334799125, 0, 0), x_dir=(0, 0, -1), z_dir=(1, 0, 0))):
        with Locations((0, -18.484260538)):
            Circle(SKETCH8_R)
    extrude(amount=-BOSS_EXTRUDE2_DEPTH)

    # Sketch10 → Cut-Extrude5 (cut)
    with BuildSketch(Plane.ZY.offset(12.665200875)):
        with Locations((0, -18.484260538)):
            Circle(SKETCH10_R)
    extrude(amount=-CUT_EXTRUDE5_DEPTH, mode=Mode.SUBTRACT)

    # Sketch11 → Boss-Extrude3 (add)
    with BuildSketch(Plane(origin=(17.334799125, 0, 0), x_dir=(0, 0, -1), z_dir=(1, 0, 0))):
        with Locations(Location((0, -18.484260538, 0), (0, 0, 180))):
            Circle(SKETCH11_R)
    extrude(amount=-BOSS_EXTRUDE3_DEPTH)

    # Sketch12 → Cut-Extrude6 (cut)
    with BuildSketch(Plane(origin=(17.334799125, 0, 0), x_dir=(0, 0, -1), z_dir=(1, 0, 0)).offset(CUT_EXTRUDE6_START)):
        with Locations(Location((0, -18.484260538, 0), (0, 0, 180))):
            Circle(SKETCH12_R)
    extrude(amount=CUT_EXTRUDE6_DEPTH, mode=Mode.SUBTRACT)

    # Sketch7 → Cut-Extrude8 (cut, through all)
    with BuildSketch(Plane.ZY.offset(12.665200875)):
        with Locations((0, -18.484260538)):
            Circle(SKETCH7_R)
    extrude(amount=-CUT_EXTRUDE8_DEPTH, mode=Mode.SUBTRACT)


solid = part.part
